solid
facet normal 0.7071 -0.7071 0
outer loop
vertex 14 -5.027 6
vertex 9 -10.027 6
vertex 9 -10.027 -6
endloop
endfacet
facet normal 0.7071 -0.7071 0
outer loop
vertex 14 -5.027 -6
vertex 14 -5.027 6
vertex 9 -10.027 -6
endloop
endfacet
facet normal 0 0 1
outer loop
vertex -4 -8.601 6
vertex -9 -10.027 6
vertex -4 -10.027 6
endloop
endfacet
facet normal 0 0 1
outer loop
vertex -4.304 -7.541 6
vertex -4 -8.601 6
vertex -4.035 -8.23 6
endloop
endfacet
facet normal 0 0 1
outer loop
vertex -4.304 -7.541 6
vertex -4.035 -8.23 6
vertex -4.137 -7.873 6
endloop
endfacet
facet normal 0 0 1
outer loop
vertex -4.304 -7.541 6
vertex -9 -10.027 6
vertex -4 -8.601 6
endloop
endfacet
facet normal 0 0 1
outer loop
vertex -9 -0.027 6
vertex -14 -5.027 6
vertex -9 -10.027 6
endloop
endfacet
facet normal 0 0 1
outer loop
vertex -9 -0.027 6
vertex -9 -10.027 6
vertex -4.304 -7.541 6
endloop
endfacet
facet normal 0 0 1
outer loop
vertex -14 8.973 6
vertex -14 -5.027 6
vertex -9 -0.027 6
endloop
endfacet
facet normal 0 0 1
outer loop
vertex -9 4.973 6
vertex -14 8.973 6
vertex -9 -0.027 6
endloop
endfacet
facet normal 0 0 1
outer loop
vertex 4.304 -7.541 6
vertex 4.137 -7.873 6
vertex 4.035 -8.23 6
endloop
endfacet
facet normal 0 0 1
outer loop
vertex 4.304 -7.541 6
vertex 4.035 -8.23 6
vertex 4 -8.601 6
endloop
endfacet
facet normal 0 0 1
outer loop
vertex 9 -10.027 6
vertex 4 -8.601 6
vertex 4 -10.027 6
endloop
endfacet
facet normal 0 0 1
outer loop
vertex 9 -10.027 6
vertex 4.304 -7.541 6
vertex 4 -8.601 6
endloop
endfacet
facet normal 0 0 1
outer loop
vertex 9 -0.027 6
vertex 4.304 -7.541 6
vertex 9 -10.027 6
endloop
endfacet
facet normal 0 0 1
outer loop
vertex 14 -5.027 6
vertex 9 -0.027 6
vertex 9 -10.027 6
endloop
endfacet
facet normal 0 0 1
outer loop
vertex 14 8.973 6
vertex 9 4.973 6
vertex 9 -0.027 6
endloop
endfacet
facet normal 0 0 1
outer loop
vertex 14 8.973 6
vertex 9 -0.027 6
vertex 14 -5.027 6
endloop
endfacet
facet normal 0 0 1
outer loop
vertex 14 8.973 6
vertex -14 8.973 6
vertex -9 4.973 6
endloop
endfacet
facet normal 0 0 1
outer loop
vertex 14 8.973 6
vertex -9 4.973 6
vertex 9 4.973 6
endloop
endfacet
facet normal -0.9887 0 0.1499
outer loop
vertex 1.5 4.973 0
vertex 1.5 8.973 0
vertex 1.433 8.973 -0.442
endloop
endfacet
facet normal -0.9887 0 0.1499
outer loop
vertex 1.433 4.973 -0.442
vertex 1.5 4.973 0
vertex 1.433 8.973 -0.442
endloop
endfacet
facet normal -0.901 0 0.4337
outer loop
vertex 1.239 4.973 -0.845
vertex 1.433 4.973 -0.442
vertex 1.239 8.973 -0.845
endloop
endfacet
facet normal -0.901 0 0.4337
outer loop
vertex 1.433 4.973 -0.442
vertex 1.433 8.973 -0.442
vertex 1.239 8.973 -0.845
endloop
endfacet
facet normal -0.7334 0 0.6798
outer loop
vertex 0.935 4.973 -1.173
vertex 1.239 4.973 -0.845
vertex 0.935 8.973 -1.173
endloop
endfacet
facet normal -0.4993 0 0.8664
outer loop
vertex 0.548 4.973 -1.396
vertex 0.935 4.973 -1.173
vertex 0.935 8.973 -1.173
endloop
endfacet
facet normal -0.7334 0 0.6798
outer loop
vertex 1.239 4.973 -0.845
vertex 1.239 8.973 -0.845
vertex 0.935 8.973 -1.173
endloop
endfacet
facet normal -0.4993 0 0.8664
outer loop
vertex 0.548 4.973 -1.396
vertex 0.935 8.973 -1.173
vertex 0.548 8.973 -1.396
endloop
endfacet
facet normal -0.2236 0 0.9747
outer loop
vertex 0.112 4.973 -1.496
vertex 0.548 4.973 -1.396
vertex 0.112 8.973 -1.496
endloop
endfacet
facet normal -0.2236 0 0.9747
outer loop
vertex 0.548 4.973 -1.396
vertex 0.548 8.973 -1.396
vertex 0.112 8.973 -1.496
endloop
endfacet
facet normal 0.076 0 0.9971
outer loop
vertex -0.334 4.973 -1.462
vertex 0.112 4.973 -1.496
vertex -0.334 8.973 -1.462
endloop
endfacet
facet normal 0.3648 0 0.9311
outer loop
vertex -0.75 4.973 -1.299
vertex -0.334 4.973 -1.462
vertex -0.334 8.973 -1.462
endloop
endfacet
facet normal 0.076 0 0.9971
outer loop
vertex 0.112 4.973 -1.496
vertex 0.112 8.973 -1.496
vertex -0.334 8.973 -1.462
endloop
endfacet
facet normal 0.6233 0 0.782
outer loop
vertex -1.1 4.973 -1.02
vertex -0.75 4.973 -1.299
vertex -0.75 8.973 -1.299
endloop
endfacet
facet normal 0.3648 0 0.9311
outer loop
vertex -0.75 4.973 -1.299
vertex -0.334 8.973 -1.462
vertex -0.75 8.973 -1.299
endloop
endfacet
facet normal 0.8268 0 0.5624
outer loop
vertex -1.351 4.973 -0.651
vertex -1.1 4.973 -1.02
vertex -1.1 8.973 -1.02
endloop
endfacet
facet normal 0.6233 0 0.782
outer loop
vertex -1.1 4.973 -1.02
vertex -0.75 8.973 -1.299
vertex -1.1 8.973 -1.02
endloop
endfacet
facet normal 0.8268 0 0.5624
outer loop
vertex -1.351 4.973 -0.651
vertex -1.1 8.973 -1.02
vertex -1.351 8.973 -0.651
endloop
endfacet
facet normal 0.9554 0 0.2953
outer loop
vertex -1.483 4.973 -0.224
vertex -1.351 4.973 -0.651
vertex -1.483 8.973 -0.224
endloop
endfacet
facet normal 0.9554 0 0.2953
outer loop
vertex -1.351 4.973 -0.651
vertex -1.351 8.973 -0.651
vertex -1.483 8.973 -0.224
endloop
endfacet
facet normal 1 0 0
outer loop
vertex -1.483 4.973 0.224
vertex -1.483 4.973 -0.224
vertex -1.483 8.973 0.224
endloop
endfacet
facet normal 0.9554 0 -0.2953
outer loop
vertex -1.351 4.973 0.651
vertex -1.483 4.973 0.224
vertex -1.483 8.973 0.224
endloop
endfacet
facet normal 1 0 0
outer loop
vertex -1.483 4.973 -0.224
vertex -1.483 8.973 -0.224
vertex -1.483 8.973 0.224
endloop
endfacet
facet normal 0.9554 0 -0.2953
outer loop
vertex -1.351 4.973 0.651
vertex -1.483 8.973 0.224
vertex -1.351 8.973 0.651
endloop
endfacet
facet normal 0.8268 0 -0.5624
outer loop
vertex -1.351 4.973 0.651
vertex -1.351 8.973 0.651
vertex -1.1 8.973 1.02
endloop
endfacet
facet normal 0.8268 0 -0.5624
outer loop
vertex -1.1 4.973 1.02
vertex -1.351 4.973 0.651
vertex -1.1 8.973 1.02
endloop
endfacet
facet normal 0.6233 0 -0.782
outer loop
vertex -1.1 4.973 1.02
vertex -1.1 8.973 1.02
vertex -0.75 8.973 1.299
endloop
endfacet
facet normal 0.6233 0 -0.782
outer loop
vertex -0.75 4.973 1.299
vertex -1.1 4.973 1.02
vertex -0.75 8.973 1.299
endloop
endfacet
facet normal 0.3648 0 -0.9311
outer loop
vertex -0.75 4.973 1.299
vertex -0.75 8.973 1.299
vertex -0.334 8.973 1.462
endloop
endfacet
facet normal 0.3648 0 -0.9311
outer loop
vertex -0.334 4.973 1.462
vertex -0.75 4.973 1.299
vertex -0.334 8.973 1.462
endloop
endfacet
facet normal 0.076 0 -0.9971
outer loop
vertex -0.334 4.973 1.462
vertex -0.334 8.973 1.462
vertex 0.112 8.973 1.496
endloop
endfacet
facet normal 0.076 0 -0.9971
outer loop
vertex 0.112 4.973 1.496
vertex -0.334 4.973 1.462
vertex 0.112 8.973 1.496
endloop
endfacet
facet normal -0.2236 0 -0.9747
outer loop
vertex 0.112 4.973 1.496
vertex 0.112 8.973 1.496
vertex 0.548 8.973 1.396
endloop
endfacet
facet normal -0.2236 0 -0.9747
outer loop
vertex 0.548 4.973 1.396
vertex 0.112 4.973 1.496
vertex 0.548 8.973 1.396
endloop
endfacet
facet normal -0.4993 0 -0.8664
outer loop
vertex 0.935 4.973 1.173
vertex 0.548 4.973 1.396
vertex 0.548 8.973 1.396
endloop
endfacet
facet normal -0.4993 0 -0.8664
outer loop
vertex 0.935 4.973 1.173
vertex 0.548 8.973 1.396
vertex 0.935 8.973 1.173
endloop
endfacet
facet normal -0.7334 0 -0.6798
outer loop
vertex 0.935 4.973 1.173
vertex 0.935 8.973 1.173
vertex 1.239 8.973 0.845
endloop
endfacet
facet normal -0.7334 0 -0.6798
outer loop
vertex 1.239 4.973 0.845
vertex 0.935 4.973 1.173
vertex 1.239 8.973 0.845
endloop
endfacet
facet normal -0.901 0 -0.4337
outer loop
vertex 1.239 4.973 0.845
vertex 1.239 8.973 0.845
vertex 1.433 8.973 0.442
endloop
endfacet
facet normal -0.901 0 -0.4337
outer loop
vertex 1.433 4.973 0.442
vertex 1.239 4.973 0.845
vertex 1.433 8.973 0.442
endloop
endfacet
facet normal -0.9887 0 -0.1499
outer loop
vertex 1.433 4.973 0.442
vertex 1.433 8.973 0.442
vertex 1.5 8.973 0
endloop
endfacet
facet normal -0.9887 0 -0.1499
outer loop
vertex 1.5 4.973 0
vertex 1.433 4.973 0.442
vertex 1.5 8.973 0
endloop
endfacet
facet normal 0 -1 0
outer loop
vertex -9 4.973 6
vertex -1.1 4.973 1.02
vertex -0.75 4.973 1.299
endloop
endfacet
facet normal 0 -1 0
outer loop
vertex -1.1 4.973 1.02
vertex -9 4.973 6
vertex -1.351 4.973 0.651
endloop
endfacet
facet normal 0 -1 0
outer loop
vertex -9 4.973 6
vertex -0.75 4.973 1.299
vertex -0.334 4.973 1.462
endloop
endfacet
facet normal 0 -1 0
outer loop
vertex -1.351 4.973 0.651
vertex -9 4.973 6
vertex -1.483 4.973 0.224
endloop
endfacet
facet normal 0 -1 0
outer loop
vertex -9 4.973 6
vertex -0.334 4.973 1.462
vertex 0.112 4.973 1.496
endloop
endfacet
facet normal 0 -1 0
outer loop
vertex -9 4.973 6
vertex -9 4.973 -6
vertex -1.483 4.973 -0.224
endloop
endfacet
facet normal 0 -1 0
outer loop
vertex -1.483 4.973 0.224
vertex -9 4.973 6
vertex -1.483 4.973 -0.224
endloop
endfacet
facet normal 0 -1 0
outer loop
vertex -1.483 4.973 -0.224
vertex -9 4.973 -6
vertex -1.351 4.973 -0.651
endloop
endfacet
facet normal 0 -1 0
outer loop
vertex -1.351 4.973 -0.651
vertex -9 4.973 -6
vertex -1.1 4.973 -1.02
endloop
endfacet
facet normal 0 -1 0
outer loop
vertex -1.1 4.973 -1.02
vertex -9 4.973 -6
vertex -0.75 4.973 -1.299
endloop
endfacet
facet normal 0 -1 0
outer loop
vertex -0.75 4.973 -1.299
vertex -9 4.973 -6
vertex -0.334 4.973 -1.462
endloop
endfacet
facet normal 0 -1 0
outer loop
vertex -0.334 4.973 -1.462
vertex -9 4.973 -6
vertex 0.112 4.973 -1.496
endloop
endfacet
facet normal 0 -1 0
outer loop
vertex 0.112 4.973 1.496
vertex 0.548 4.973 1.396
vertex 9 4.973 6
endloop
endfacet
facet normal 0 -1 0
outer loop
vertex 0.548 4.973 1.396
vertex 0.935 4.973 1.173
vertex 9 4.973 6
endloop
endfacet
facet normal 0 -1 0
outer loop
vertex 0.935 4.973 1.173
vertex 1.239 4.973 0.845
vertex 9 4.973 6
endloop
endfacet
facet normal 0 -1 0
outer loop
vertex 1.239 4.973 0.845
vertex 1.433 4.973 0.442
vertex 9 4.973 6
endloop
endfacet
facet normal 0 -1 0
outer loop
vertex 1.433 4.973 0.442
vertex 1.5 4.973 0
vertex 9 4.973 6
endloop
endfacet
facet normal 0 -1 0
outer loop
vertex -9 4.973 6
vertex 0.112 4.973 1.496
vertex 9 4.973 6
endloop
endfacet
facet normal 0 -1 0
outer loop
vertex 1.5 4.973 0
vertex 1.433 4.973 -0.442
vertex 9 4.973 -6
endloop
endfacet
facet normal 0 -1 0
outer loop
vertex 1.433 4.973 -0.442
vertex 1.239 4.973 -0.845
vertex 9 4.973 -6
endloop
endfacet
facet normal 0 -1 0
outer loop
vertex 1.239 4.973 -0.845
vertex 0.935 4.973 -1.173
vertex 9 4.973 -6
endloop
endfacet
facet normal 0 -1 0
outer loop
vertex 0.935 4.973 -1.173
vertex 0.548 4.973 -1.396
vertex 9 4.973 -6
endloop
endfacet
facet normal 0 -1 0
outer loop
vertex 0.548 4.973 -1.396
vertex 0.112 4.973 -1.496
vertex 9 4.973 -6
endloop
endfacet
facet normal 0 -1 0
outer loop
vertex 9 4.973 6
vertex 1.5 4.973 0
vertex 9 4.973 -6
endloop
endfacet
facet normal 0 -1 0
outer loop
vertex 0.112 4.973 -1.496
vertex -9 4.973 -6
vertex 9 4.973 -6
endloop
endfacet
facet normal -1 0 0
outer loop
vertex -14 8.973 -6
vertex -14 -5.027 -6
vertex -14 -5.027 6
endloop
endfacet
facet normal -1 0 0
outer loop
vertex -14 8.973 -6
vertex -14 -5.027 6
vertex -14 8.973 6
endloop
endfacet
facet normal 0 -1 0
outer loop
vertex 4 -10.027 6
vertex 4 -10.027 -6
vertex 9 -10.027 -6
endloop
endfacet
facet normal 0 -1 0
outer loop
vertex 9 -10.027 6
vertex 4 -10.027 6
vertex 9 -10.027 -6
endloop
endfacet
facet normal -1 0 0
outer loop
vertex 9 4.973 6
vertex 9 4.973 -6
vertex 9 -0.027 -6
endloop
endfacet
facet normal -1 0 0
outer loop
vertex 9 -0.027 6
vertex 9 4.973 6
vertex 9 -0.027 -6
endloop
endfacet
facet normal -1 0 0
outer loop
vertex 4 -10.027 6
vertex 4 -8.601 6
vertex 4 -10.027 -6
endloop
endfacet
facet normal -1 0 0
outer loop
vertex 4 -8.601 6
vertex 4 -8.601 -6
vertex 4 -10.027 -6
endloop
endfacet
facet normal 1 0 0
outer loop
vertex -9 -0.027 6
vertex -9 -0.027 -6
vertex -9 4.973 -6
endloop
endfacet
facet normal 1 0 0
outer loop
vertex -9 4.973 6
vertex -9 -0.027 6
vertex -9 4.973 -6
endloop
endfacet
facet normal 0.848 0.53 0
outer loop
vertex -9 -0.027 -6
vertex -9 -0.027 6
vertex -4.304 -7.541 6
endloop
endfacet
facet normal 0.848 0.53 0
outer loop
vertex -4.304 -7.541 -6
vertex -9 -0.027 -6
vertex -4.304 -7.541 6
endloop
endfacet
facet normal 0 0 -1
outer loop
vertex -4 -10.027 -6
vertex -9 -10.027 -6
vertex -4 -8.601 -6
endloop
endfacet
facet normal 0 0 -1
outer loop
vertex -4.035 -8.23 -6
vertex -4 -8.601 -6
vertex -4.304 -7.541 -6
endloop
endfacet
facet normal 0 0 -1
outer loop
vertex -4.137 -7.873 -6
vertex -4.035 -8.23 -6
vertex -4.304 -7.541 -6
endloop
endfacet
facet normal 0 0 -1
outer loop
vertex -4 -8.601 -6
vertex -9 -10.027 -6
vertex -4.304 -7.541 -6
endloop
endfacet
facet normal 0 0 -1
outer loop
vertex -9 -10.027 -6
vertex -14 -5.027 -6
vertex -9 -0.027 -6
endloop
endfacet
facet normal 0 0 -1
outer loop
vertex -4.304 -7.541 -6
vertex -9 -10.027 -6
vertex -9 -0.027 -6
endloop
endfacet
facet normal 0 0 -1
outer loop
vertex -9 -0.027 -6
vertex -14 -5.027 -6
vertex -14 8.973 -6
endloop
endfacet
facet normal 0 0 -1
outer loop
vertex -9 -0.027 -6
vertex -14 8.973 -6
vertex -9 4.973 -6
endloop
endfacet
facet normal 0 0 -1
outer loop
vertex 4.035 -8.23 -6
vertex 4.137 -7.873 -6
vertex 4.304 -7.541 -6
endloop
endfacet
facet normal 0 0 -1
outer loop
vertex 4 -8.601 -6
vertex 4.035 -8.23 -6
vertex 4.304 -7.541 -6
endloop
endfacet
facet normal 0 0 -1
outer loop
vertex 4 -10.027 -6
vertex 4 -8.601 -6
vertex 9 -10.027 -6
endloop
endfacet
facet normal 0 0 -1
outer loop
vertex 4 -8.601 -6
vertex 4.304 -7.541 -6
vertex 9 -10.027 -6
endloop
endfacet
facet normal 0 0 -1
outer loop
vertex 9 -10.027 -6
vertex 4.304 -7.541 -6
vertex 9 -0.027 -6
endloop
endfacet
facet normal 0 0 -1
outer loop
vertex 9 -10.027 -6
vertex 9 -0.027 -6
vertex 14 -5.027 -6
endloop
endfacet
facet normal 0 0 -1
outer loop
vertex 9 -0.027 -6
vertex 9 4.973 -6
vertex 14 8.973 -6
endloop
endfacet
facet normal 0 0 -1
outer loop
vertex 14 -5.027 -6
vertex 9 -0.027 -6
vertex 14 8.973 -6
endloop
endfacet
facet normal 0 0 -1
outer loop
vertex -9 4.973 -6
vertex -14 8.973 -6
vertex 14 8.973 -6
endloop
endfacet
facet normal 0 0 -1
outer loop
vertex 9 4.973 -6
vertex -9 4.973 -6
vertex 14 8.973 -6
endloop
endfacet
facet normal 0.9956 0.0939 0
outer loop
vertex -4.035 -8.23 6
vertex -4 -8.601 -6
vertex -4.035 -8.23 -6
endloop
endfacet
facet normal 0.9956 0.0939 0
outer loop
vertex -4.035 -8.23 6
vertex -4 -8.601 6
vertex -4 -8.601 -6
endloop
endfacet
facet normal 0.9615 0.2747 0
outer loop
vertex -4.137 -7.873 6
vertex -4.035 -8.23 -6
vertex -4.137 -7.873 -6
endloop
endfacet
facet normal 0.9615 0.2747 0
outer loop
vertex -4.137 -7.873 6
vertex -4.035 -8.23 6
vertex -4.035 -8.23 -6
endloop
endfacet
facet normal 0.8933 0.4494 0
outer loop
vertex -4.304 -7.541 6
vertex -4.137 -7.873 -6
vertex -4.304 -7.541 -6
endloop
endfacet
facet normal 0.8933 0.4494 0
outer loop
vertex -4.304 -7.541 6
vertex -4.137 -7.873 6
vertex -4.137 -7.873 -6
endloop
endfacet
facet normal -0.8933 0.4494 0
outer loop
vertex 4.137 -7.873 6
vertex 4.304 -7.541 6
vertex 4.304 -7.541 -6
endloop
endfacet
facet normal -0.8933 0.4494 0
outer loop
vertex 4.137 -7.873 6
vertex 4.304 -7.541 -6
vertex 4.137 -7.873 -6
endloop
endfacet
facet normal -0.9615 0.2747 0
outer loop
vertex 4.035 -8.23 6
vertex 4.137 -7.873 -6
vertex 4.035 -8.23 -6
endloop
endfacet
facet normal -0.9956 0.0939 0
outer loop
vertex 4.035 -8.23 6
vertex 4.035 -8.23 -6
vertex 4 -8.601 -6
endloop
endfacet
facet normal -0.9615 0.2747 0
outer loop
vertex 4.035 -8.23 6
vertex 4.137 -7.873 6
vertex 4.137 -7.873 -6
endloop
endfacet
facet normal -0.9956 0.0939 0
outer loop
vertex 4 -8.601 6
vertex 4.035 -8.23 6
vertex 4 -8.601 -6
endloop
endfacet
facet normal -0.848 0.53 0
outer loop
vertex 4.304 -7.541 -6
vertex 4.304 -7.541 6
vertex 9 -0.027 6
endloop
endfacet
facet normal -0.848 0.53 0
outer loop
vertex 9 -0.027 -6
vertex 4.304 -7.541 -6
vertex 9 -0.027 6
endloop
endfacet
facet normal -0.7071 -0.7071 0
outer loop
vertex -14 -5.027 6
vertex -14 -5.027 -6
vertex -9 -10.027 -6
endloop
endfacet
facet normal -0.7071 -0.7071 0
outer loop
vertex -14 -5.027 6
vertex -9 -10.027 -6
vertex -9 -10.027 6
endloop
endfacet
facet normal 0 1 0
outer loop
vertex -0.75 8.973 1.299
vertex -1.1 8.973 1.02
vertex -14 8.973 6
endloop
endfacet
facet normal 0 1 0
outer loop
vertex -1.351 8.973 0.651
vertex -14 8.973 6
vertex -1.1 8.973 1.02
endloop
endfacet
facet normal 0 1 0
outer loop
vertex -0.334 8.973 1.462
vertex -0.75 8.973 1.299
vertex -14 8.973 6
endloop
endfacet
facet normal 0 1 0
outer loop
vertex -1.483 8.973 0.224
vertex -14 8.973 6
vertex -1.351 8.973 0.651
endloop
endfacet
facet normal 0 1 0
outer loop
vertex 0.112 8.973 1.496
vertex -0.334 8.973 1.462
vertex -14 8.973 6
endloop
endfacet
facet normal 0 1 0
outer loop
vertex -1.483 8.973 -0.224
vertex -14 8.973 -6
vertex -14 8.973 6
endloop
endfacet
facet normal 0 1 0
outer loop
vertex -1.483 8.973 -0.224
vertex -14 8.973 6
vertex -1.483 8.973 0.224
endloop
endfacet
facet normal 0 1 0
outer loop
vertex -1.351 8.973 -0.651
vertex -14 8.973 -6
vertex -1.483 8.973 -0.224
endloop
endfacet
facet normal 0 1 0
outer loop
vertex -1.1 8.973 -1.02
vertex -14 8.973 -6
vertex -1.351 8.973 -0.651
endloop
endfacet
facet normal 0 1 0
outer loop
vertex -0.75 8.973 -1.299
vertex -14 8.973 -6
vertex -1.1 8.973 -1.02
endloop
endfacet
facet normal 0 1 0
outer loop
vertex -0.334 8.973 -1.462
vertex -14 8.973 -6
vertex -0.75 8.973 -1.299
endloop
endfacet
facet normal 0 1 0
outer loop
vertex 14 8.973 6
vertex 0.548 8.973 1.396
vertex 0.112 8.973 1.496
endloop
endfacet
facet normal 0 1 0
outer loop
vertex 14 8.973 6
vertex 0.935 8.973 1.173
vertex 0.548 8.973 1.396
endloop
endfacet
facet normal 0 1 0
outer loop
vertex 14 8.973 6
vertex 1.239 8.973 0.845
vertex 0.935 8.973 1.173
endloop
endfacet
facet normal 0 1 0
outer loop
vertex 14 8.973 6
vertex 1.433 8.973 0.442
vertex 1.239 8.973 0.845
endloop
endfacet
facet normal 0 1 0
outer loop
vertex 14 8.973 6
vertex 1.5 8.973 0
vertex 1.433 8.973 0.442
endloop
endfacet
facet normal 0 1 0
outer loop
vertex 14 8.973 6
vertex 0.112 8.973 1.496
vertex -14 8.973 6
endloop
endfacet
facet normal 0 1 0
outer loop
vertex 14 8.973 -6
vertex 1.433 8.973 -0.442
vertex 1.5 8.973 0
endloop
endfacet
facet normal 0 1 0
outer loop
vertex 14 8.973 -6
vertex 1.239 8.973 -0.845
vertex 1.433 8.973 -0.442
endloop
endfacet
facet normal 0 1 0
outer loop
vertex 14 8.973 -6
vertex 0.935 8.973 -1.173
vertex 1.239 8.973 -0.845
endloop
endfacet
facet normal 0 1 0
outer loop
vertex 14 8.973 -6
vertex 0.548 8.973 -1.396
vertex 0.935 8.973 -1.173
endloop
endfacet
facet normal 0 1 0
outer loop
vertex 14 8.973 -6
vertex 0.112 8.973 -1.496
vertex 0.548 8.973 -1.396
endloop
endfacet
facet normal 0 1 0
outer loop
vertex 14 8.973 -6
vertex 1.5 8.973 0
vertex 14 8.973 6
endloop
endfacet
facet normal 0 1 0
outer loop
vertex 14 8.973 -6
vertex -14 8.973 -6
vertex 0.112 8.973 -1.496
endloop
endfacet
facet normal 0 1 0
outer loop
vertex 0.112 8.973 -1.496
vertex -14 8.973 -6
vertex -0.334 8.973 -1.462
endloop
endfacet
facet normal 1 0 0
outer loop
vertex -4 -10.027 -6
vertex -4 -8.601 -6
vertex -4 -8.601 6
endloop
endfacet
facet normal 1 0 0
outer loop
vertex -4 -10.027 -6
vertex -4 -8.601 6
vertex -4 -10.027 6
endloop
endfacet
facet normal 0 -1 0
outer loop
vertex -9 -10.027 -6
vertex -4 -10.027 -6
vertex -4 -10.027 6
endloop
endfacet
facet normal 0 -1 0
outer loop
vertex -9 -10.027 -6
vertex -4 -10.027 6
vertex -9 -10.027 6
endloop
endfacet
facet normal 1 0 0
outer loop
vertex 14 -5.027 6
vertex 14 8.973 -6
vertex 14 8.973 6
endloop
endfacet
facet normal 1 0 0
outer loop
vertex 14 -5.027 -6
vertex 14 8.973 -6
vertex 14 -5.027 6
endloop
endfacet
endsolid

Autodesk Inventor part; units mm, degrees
ref_plane "YZ Plane" through (0, 0, 0) normal (1, 0, 0) x (0, 1, 0)
ref_plane "XZ Plane" through (0, 0, 0) normal (0, 1, 0) x (-1, 0, 0)
ref_plane "XY Plane" through (0, 0, 0) normal (0, 0, 1) x (1, 0, 0)
sketch "スケッチ1" plane through (0, 0, 0) normal (0, 0, 1) x (1, 0, 0)
  line L0 (-14, 8.973) -> (14, 8.973)
  line L1 (14, 8.973) -> (14, -10.027)
  line L2 (4, -8.027) -> (9, -0.027)
  line L3 (-9, -0.027) -> (-4, -8.027)
  line L4 (-14, -10.027) -> (-14, 8.973)
  line L5 (-4, -8.027) -> (-4, -10.027)
  line L6 (-4, -10.027) -> (-14, -10.027)
  line L7 (4, -8.027) -> (4, -10.027)
  line L8 (4, -10.027) -> (14, -10.027)
  line L9 (0, -13.827) -> (0, 12.773) projected
  line L10 (-9, -0.027) -> (-9, 4.973)
  line L11 (-9, 4.973) -> (9, 4.973)
  line L12 (9, 4.973) -> (9, -0.027)
  point P0 (0, 0)
  dimension "d1" = 8
  dimension "d2" = 18
  dimension "d3" = 10
  dimension "d6" = 2
  dimension "d7" = 5
  dimension "d8" = 4
  dimension "d9" = 15
extrude "押し出し1" add sketch "スケッチ1" along normal mid plane 12
sketch "スケッチ2" plane through (-14, 8.973, 6) normal (0, 1, 0) x (1, 0, 0)
  circle A0 centre (14, 6) radius 1.5
  dimension "d12" = 3
extrude "押し出し2" cut sketch "スケッチ2" against normal through all
fillet "フィレット1" radius 2 2 edges at (-4, -8.027, 0) (4, -8.027, 0)
chamfer "面取り1" distance 5 angle 45 2 edges at (-14, -10.027, 0) (14, -10.027, 0)
properties part number "gripper"
